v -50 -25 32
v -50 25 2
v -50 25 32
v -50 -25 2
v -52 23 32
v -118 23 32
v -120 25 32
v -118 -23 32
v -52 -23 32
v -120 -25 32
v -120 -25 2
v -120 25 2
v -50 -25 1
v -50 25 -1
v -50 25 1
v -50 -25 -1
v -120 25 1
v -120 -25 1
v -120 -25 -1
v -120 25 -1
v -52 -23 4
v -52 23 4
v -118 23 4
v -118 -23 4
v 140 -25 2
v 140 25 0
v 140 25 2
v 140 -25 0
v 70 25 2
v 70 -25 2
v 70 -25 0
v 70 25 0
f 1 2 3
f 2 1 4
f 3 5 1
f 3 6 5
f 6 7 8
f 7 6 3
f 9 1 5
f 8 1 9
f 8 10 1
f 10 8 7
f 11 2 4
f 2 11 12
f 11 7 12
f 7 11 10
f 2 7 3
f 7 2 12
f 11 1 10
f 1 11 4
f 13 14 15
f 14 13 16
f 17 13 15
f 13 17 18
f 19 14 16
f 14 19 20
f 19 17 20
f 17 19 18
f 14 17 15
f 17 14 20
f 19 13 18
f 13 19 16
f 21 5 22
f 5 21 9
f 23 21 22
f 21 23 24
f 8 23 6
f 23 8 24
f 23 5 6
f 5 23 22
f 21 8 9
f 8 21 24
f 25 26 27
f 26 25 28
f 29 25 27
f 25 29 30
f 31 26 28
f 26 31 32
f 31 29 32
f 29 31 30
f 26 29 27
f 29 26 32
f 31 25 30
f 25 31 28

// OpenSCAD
// Built by bench/smallmodels/features/compiler.py from a list of features.
$fn = 64;
difference() {
  union() {
    translate([-85, 0, 2]) translate([-35, -25, 0]) cube([70, 50, 30]);
    translate([-85, 0, -1]) translate([-35, -25, 0]) cube([70, 50, 2]);
  }
  translate([-118, -23, 4]) cube([66, 46, 29]);  // shell, wall 2, open top
}
difference() {
  union() {
    translate([105, 0, 0]) translate([-35, -25, 0]) cube([70, 50, 2]);
  }
  union() {
    translate([0, 0, -0.01]) rotate([0, 0, 0]) translate([-32.8, -22.8, 0]) cube([65.6, 45.6, 2.02]);
  }
}
